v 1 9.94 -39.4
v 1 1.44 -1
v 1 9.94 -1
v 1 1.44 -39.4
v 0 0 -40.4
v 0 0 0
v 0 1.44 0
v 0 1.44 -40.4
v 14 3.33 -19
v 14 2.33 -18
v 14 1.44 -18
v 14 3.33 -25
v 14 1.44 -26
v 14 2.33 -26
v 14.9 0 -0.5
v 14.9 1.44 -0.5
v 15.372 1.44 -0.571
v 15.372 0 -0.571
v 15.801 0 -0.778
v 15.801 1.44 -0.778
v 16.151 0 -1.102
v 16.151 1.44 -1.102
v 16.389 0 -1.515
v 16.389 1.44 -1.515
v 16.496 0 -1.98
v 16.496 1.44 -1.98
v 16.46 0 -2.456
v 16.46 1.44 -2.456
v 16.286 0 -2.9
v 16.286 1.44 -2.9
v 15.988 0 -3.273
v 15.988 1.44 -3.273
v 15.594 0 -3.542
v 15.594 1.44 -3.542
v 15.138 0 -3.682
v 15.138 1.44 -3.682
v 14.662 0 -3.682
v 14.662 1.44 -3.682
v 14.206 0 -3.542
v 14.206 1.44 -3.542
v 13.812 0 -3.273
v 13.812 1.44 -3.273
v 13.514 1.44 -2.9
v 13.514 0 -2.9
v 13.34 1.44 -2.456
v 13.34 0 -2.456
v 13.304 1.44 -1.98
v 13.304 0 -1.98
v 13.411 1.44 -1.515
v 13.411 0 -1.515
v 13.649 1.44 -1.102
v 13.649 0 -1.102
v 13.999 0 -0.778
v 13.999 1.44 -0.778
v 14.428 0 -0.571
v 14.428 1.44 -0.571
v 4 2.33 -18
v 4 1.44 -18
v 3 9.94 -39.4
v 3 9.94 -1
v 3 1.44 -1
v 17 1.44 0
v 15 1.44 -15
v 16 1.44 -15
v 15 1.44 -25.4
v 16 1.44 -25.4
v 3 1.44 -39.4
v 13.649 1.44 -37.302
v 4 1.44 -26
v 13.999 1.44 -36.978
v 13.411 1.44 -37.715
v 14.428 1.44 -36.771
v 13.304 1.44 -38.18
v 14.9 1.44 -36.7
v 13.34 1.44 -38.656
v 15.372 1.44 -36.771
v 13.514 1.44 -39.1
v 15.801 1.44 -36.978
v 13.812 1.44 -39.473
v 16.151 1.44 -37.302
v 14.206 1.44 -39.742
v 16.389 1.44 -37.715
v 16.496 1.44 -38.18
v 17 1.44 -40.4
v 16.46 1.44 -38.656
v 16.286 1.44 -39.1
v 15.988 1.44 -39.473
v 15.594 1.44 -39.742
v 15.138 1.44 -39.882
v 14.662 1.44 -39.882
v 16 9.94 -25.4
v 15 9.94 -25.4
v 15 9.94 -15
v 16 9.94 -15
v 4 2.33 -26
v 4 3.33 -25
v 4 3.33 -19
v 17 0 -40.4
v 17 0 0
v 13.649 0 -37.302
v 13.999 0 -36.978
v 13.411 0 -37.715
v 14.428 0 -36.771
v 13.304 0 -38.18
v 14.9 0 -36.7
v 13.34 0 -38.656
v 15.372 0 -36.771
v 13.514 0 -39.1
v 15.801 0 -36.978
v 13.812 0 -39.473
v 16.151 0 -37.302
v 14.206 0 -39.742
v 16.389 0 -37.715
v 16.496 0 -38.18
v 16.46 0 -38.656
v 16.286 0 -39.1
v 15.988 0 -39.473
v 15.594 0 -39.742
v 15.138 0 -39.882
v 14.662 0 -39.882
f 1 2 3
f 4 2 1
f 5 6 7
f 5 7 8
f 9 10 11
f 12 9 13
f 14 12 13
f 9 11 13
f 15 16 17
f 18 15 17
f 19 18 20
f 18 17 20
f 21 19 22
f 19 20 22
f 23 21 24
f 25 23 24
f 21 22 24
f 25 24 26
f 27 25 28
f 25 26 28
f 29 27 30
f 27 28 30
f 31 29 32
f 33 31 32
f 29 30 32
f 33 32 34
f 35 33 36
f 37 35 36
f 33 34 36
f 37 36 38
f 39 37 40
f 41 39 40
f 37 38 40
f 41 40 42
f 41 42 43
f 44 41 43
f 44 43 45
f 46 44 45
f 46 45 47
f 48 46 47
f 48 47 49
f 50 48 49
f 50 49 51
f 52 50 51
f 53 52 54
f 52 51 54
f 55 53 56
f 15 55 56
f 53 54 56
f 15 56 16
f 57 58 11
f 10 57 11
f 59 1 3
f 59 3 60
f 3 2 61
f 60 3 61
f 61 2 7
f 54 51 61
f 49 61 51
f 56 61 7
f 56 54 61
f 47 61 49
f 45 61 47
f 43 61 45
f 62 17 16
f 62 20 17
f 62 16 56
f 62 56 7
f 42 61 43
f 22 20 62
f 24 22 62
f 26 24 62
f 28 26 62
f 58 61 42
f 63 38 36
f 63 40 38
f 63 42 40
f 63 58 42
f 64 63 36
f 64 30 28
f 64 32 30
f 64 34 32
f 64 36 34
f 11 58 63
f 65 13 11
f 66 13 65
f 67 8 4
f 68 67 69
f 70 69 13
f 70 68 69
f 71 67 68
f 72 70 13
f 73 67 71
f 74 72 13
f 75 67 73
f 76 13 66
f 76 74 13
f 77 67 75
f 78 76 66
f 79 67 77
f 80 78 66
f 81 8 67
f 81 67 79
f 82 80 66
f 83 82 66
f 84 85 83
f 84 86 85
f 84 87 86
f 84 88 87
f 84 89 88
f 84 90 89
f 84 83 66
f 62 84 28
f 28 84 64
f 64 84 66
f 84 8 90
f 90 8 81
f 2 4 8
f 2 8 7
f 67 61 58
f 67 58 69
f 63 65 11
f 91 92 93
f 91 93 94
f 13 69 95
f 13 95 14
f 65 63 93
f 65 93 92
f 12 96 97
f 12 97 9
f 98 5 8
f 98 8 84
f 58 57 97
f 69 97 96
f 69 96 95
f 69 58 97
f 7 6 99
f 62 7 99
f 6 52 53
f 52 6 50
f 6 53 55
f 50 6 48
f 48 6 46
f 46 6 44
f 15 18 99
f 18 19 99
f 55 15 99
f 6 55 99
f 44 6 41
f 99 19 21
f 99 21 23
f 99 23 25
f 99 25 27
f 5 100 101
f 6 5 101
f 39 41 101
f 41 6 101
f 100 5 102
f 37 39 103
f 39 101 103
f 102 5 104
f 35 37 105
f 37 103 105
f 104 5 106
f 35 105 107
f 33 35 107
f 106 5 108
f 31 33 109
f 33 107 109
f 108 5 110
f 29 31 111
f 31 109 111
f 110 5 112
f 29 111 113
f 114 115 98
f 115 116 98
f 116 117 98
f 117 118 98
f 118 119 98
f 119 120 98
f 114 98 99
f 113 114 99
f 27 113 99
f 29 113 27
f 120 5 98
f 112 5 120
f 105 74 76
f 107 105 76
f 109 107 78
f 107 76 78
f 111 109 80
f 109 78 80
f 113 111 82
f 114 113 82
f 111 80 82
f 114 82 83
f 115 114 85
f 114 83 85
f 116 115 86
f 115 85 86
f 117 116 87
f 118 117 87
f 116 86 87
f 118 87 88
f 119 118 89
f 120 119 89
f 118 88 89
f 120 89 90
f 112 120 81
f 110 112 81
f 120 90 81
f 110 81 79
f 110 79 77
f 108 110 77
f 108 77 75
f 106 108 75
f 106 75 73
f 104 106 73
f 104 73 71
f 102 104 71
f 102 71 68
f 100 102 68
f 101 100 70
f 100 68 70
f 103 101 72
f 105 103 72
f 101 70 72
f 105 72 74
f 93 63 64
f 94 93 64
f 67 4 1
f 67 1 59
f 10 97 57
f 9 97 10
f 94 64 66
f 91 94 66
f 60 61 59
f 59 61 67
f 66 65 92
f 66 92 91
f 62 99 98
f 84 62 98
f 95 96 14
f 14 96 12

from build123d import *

# Parameters (mm, degrees)
SKETCH1_W           = 17
SKETCH1_H           = 40.4
BOSS_EXTRUDE1_DEPTH = 1.44
SKETCH2_R           = 1.6
CUT_EXTRUDE1_DEPTH  = 1.44
SKETCH3_W           = 10
SKETCH3_H           = 8
BOSS_EXTRUDE2_DEPTH = 1.89
CHAMFER1_SIZE       = 1
SKETCH4_W           = 2
SKETCH4_H           = 38.4
SKETCH4_W_2         = 1
SKETCH4_H_2         = 10.4
BOSS_EXTRUDE3_DEPTH = 8.5


with BuildPart() as part:
    # Sketch1 → Boss-Extrude1 (new body)
    with BuildSketch(Plane(origin=(0, 0, 0), x_dir=(1, 0, 0), z_dir=(0, 1, 0))):
        with Locations((8.5, 20.2)):
            Rectangle(SKETCH1_W, SKETCH1_H)
    extrude(amount=BOSS_EXTRUDE1_DEPTH)

    # Sketch2 → Cut-Extrude1 (cut)
    with BuildSketch(Plane(origin=(0, 1.44, 0), x_dir=(1, 0, 0), z_dir=(0, 1, 0))):
        with Locations(Location((14.9, 38.3, 0), (0, 0, 270))):
            Circle(SKETCH2_R)
        with Locations(Location((14.9, 2.1, 0), (0, 0, 270))):
            Circle(SKETCH2_R)
    extrude(amount=-CUT_EXTRUDE1_DEPTH, mode=Mode.SUBTRACT)

    # Sketch3 → Boss-Extrude2 (add)
    with BuildSketch(Plane(origin=(0, 1.44, 0), x_dir=(1, 0, 0), z_dir=(0, 1, 0))):
        with Locations((9, 22)):
            Rectangle(SKETCH3_W, SKETCH3_H)
    extrude(amount=BOSS_EXTRUDE2_DEPTH)

    # Chamfer1
    chamfer1_edges = [part.edges().sort_by_distance(p)[0] for p in [
        (9, 3.33, -18),
        (9, 3.33, -26),
    ]]
    chamfer(chamfer1_edges, length=CHAMFER1_SIZE)

    # Sketch4 → Boss-Extrude3 (add)
    with BuildSketch(Plane(origin=(0, 1.44, 0), x_dir=(1, 0, 0), z_dir=(0, 1, 0))):
        with Locations((2, 20.2)):
            Rectangle(SKETCH4_W, SKETCH4_H)
        with Locations((15.5, 20.2)):
            Rectangle(SKETCH4_W_2, SKETCH4_H_2)
    extrude(amount=BOSS_EXTRUDE3_DEPTH)


solid = part.part
